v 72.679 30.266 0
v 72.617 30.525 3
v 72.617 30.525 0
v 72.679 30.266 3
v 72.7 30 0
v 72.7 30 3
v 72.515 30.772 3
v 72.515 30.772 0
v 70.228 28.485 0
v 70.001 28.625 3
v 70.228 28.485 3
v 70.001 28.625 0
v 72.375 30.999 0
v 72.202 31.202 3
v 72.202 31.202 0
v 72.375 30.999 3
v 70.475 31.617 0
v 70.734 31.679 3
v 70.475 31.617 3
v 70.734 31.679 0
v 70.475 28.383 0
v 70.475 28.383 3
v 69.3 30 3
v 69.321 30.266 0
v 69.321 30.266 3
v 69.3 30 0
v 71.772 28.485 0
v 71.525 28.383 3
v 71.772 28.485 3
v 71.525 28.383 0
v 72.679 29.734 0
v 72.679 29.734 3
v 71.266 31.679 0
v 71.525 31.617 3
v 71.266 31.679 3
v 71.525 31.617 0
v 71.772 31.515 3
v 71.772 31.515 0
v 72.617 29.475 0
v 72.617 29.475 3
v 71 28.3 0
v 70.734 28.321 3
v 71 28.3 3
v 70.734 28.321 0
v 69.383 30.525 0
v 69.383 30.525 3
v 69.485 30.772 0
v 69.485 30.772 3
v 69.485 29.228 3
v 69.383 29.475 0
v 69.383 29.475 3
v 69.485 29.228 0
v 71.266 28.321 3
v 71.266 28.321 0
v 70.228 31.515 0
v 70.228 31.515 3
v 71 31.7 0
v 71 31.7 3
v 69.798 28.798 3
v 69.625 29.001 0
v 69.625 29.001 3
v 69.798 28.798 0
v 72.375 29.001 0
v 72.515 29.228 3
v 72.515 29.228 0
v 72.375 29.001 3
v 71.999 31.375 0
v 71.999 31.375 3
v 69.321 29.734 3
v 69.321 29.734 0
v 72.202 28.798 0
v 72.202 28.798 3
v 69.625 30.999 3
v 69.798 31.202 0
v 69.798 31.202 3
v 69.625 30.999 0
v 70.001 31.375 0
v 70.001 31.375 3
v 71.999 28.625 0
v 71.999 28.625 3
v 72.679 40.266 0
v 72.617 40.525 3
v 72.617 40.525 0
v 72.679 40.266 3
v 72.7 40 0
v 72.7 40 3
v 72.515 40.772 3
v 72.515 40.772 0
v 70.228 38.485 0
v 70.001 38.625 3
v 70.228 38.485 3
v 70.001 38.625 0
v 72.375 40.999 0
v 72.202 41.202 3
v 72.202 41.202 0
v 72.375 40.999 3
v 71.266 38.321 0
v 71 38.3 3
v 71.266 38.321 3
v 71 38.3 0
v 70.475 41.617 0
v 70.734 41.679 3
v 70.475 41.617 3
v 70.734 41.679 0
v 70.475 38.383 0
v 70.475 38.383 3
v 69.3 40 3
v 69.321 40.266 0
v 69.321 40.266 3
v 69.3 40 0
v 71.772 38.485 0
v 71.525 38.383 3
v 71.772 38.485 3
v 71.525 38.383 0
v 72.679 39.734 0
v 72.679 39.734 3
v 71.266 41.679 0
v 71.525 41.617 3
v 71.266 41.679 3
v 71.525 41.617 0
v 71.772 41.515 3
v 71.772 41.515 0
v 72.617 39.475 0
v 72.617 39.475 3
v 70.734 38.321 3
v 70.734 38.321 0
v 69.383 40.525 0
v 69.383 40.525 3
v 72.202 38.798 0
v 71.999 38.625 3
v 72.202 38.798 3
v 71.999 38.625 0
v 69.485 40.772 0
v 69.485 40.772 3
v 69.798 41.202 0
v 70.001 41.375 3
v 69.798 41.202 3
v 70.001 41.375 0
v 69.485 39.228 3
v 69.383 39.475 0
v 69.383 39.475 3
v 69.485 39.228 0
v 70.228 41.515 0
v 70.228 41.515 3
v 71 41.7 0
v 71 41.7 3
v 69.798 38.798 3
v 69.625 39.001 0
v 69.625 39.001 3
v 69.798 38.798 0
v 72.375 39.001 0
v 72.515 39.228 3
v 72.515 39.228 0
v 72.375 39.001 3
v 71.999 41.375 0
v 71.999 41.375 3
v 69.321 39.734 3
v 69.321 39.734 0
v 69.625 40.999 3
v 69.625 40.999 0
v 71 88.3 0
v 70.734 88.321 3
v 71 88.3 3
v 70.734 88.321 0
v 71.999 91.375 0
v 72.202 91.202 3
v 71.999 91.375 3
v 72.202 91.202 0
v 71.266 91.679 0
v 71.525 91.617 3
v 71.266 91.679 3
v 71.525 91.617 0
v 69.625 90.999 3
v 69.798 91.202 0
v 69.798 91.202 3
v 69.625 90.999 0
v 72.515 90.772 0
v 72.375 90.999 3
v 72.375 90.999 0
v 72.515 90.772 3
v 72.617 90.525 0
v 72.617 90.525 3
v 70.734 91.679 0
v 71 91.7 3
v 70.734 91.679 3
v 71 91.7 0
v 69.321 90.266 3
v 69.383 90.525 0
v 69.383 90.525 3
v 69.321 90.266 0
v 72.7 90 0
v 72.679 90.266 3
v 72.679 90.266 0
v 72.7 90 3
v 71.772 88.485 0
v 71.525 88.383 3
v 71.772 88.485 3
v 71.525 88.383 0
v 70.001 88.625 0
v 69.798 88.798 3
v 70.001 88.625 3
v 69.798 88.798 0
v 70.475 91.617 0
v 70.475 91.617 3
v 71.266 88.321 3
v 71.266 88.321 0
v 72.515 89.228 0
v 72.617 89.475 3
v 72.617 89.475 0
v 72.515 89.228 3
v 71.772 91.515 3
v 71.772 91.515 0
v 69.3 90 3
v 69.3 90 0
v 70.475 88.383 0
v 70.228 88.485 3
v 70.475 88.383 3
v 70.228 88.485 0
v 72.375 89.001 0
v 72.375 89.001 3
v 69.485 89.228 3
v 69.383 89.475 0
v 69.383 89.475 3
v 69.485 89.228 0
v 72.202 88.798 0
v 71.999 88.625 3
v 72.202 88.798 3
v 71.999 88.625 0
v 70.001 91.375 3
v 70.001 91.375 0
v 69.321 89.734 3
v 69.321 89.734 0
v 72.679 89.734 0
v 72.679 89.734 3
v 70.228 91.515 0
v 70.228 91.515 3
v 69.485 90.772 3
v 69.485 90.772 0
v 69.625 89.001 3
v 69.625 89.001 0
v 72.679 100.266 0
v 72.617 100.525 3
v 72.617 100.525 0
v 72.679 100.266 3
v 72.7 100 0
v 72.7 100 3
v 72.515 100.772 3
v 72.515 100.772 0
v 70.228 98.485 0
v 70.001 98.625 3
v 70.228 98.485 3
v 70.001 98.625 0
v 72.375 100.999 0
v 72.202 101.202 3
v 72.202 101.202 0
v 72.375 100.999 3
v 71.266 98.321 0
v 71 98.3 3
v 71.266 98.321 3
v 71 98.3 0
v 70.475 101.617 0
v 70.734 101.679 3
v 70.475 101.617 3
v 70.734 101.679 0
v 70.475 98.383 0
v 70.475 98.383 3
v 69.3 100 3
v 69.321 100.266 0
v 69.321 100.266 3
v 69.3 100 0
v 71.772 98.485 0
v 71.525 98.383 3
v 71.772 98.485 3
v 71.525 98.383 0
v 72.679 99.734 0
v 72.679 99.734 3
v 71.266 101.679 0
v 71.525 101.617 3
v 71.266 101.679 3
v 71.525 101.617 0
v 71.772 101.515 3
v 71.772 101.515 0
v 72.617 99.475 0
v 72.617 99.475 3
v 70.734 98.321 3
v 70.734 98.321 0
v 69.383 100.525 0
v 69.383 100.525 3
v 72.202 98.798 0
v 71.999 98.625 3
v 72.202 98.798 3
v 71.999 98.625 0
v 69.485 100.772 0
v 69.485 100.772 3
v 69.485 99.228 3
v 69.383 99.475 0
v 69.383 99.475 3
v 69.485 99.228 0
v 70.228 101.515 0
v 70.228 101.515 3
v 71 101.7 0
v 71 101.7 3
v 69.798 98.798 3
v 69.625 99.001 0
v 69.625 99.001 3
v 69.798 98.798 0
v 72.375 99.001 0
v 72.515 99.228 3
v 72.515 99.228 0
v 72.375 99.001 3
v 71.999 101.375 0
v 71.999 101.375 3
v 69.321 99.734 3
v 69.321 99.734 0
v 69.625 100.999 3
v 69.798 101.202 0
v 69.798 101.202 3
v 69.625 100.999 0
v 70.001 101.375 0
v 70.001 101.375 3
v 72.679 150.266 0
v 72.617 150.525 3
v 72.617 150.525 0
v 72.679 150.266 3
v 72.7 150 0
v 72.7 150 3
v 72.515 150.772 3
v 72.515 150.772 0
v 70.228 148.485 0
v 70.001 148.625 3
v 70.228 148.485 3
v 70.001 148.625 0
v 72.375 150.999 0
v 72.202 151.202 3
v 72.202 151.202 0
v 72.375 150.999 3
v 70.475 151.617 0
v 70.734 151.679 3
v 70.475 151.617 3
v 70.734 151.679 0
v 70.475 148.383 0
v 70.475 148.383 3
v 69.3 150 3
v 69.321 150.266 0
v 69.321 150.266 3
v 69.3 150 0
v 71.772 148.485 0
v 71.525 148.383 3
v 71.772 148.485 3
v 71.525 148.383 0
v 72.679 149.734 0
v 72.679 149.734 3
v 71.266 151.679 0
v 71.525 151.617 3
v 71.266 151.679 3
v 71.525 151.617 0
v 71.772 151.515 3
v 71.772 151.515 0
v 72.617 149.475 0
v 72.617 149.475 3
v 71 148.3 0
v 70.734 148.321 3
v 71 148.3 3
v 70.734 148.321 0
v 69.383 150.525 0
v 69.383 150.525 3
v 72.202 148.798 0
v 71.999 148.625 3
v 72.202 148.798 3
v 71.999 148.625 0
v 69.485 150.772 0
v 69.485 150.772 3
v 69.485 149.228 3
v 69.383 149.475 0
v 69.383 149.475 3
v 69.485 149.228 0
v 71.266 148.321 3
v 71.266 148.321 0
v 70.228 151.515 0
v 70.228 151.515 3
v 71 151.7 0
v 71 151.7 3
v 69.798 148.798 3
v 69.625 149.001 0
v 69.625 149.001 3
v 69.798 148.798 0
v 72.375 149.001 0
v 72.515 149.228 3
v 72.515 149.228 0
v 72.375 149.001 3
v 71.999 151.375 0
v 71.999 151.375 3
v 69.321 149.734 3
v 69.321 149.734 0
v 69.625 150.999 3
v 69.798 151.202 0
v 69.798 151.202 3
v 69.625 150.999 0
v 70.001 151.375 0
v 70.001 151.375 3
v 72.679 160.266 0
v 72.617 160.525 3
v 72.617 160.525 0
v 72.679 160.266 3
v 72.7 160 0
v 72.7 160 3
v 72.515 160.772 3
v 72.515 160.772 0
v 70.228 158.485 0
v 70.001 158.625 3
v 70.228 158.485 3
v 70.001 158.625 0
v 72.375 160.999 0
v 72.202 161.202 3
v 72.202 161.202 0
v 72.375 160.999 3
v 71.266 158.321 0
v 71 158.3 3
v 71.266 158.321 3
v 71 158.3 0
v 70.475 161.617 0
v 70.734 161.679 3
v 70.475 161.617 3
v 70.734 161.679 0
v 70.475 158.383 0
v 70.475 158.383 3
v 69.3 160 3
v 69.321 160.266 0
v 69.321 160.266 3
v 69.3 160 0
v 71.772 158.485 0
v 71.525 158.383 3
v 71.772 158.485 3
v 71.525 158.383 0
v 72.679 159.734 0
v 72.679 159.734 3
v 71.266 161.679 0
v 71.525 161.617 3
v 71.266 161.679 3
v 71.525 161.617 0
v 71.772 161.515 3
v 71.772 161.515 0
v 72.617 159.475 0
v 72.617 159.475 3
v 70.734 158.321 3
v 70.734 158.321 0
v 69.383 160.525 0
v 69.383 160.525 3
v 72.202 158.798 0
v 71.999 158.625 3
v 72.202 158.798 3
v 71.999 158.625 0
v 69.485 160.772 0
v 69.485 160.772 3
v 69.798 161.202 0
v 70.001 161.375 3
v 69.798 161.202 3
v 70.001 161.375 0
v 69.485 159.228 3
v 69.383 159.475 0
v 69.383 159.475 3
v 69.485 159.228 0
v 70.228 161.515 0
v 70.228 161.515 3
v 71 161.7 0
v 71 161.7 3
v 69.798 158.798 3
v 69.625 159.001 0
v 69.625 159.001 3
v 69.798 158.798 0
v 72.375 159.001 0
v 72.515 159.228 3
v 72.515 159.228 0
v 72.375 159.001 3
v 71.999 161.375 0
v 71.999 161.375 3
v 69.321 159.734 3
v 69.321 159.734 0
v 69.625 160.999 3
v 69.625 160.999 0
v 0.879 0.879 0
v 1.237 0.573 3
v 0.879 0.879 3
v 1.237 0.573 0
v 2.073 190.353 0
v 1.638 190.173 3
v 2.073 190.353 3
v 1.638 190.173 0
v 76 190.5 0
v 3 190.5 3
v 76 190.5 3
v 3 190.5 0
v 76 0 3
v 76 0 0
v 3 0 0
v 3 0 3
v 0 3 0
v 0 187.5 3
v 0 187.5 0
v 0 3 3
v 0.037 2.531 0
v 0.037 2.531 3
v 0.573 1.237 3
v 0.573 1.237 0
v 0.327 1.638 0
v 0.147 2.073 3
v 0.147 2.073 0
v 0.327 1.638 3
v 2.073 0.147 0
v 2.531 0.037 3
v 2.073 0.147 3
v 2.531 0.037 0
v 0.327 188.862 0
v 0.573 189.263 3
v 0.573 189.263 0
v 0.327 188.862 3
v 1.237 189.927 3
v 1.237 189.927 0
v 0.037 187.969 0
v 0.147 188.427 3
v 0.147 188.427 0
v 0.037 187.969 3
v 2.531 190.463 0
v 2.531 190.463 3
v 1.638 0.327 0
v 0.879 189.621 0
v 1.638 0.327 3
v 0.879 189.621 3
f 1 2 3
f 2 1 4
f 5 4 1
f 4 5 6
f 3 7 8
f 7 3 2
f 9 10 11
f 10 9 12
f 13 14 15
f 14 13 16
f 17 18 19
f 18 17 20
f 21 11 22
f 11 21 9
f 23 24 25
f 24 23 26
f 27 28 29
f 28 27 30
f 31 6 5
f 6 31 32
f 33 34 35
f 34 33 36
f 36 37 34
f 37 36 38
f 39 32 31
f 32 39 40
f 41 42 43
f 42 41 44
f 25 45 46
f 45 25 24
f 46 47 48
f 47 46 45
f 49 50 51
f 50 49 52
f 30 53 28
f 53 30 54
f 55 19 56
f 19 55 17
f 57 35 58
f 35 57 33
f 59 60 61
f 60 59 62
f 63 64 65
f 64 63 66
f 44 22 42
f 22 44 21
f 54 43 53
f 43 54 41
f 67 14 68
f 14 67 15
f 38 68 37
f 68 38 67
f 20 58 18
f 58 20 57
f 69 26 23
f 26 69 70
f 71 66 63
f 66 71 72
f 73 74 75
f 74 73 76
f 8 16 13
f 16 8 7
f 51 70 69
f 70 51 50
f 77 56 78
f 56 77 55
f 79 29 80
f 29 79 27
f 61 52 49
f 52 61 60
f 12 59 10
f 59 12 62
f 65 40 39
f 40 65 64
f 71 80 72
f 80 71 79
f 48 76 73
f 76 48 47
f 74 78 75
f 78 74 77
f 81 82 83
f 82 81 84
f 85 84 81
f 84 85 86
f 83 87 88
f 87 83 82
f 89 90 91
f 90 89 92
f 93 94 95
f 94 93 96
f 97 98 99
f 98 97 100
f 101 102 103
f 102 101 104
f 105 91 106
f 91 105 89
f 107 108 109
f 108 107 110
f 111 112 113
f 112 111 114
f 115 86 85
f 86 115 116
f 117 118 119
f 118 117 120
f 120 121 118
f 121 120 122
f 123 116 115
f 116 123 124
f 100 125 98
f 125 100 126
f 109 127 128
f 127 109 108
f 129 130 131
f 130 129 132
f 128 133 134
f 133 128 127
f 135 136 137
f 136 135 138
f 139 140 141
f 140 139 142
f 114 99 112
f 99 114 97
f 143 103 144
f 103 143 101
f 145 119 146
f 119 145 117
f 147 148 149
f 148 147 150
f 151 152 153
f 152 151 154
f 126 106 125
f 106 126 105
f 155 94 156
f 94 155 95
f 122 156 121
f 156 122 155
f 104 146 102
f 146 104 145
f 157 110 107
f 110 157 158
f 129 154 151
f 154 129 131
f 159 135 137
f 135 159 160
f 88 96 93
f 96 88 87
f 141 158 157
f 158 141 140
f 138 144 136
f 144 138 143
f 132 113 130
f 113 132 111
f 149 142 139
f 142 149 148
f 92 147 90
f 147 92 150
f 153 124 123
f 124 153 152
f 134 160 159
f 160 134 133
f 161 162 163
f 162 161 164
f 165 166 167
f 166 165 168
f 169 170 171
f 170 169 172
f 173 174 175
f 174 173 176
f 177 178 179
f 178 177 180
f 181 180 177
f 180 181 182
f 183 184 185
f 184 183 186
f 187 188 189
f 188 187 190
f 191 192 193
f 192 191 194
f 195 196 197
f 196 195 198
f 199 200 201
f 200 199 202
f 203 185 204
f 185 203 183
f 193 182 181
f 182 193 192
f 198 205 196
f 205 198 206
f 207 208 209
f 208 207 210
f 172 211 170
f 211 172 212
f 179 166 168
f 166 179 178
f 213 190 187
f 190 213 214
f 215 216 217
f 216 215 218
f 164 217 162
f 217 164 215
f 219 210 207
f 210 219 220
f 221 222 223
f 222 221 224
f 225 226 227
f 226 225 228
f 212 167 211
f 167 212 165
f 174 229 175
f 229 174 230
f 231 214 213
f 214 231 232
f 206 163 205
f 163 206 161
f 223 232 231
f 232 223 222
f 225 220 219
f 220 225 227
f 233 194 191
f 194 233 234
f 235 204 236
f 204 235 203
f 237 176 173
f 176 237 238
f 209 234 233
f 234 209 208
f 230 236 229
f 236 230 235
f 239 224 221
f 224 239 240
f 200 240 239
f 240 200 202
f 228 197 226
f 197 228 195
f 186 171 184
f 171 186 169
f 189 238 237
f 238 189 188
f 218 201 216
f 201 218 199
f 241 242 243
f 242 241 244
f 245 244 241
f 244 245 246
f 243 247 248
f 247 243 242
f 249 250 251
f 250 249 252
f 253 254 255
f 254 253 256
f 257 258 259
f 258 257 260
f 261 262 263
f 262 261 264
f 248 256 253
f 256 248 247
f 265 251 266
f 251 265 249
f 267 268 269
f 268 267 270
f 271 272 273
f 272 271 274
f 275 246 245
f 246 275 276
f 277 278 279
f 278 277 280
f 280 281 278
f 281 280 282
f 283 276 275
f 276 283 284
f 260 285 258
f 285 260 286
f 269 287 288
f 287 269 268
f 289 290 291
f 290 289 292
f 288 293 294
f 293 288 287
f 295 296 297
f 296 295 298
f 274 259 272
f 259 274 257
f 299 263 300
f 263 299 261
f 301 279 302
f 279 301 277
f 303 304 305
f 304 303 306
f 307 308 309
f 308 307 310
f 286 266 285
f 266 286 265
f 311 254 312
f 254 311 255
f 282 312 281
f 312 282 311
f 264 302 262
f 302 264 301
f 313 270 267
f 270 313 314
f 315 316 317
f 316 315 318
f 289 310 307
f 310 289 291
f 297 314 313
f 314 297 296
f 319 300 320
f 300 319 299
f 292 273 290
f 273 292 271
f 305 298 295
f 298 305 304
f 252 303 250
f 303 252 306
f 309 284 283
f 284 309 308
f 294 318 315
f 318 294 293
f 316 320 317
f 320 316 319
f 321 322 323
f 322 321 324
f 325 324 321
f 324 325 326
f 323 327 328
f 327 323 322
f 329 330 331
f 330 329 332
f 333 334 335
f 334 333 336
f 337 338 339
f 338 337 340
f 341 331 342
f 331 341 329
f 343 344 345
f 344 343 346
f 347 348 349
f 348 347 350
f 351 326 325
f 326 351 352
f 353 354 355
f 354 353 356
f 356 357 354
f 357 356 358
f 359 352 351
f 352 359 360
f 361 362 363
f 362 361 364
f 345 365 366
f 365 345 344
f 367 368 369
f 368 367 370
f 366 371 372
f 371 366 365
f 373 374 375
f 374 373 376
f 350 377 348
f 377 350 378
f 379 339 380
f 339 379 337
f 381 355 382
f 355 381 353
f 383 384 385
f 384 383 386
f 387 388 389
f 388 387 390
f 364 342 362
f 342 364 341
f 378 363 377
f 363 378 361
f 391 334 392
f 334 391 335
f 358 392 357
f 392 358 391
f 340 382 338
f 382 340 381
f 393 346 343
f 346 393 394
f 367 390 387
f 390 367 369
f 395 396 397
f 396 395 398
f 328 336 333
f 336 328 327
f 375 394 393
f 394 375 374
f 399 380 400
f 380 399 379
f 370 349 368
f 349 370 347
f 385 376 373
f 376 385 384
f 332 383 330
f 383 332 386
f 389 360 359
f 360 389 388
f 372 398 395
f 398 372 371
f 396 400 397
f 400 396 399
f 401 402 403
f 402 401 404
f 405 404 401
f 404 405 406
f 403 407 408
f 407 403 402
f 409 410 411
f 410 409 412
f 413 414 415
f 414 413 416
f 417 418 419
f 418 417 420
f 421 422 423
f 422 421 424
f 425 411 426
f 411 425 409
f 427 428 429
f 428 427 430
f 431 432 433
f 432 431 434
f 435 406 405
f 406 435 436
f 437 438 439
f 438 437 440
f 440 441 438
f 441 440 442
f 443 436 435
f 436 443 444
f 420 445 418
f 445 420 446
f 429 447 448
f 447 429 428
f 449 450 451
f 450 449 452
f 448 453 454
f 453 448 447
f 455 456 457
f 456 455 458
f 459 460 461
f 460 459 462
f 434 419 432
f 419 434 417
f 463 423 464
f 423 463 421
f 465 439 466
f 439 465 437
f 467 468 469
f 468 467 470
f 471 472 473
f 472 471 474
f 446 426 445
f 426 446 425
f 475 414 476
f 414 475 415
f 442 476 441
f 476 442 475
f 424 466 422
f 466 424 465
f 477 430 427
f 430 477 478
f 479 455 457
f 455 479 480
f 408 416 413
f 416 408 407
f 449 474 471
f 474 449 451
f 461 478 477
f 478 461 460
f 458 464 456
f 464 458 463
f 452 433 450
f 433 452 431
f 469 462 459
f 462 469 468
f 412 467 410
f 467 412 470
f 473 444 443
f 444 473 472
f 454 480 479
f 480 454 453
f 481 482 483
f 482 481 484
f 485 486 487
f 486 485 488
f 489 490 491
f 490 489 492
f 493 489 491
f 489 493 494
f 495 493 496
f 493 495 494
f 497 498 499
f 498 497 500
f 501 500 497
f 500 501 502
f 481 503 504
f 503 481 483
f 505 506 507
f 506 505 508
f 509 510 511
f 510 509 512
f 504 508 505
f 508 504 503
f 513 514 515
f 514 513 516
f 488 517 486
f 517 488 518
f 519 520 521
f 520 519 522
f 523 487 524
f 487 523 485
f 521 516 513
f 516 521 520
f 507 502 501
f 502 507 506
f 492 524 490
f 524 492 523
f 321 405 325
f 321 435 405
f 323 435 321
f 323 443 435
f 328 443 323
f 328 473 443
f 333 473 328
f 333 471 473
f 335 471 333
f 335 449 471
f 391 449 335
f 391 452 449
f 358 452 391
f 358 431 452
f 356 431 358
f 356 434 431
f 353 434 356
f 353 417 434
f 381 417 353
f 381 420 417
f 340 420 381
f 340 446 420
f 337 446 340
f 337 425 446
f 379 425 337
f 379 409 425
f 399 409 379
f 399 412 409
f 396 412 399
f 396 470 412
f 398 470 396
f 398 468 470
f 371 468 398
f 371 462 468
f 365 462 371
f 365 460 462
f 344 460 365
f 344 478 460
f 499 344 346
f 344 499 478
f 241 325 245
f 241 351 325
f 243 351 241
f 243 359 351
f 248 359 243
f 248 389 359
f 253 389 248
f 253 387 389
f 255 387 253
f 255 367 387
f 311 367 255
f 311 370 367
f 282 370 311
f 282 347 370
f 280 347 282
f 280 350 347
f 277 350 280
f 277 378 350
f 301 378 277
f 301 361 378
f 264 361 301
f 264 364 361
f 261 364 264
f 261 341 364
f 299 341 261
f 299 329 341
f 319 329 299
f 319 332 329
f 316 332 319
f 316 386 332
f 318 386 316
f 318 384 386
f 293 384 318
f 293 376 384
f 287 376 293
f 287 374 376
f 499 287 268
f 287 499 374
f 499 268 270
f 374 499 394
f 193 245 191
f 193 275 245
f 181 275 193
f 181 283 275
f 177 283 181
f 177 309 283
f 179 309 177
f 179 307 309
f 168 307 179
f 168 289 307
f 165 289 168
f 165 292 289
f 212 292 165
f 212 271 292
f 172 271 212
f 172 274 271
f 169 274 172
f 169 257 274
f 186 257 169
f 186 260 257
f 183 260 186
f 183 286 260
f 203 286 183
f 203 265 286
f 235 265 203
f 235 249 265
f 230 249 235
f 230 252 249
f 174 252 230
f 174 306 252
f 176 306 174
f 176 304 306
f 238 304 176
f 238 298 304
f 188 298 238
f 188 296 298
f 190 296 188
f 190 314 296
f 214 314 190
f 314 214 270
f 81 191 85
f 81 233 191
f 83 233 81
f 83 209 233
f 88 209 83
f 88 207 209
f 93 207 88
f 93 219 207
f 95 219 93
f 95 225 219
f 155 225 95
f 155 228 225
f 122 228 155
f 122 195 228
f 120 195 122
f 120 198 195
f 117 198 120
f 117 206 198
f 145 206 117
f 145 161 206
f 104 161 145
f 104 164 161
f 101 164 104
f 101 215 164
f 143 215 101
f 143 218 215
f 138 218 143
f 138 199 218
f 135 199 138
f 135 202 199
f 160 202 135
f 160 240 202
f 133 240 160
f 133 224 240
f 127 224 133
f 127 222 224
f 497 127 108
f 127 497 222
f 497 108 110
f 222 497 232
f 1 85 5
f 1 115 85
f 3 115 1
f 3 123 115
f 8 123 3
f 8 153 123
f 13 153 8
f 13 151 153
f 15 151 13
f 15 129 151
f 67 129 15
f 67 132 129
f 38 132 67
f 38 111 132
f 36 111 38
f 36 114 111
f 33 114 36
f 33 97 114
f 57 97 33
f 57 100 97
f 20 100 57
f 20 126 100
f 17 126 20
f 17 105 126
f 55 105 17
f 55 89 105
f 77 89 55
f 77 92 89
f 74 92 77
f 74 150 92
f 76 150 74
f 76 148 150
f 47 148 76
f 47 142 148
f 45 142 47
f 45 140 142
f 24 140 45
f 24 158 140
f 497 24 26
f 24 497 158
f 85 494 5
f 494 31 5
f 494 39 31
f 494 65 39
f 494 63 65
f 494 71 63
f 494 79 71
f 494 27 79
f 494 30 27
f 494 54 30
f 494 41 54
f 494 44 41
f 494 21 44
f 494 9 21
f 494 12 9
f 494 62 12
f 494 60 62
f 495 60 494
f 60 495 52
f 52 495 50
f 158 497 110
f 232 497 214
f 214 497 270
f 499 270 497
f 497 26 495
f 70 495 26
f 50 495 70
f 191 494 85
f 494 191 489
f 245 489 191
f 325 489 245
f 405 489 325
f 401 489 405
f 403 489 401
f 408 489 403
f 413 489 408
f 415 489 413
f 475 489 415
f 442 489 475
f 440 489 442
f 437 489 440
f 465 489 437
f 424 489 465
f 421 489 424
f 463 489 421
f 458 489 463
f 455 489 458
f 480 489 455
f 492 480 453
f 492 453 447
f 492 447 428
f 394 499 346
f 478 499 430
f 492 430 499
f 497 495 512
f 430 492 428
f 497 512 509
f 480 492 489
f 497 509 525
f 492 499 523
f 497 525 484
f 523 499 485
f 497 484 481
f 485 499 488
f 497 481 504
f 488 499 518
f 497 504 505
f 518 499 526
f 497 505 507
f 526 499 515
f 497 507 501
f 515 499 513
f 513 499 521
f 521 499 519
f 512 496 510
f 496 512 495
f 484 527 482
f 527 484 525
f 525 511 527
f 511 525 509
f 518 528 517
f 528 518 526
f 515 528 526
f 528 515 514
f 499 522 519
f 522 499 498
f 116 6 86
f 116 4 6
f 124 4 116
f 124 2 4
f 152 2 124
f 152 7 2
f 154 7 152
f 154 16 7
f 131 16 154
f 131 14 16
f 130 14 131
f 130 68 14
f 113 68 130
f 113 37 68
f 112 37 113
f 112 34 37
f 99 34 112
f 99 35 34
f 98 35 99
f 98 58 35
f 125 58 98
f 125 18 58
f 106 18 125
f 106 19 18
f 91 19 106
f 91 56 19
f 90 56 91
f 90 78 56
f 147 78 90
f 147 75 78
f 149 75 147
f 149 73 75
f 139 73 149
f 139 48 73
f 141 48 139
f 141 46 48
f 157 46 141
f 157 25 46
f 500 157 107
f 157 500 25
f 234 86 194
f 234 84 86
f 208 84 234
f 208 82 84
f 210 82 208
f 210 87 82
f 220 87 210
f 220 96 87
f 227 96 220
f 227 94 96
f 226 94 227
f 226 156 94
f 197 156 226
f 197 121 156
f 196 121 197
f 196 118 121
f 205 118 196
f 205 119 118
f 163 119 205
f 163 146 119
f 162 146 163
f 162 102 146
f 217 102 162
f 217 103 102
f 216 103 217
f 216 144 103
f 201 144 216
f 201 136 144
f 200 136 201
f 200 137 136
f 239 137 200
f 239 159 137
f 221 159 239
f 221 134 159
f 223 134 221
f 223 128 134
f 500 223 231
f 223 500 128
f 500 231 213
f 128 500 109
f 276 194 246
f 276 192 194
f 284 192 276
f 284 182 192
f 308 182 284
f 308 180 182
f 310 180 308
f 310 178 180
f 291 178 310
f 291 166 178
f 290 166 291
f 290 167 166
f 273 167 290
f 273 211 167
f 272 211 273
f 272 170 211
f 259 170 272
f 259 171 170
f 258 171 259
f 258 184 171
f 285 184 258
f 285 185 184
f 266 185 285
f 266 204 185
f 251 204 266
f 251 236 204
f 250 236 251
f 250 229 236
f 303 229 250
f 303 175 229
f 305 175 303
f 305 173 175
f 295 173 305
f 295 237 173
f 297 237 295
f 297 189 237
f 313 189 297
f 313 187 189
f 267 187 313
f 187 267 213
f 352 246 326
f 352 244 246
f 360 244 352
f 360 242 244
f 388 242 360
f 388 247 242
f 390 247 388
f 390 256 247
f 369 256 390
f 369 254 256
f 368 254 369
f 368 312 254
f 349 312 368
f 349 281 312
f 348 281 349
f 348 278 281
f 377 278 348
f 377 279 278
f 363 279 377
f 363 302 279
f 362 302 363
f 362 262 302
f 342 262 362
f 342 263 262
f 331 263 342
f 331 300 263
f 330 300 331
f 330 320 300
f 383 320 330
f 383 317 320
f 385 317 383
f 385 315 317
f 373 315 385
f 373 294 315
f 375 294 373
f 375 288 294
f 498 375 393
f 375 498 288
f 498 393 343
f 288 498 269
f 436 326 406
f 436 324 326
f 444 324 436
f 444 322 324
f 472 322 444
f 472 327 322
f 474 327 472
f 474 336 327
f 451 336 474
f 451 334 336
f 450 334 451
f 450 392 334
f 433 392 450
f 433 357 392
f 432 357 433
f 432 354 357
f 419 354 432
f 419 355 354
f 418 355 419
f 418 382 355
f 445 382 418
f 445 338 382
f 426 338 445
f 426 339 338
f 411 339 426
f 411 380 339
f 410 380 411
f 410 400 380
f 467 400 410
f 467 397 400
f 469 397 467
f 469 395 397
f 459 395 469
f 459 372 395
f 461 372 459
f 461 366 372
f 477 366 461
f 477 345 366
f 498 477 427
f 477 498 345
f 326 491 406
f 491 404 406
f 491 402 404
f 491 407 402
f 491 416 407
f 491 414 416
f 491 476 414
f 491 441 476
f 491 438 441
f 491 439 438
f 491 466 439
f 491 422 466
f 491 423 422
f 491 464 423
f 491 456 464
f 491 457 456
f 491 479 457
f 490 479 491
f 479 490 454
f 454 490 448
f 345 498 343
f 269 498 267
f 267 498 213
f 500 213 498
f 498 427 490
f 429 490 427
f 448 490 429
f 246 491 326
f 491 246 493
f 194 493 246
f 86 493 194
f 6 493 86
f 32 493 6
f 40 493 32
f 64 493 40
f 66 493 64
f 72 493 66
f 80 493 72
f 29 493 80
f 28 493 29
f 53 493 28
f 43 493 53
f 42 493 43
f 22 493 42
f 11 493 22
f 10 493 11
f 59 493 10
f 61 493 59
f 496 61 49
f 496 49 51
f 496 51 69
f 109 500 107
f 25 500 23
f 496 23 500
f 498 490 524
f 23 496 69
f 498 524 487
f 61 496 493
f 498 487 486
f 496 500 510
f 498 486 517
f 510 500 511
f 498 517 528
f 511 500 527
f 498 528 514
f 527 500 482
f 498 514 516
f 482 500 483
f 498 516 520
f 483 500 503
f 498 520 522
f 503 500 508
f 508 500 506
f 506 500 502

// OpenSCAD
// FoldIt Robot - Left Folding Panel
// Scale: 1:4
// Dimensions: 76mm x 190.5mm x 3mm
// Folds inward (flips 180 degrees) to fold left side of clothing

$fn = 40;

// Panel parameters
panel_width = 76;       // ~half of base width (152.5 / 2)
panel_length = 190.5;   // full base length
panel_thickness = 3;

// Hinge hole parameters
m3_hole = 3.4;
hinge_hole_spacing = 30;
hinge_edge_offset = 5;       // distance from hinge edge to hole center
hinge_pair_gap = 10;

// Rounded edge radius
edge_radius = 3;

module left_panel() {
    difference() {
        // Main panel body with rounded outer edge
        _panel_body();

        // Hinge holes along inner (right) edge - matching base plate left edge
        for (i = [0:2]) {
            y_pos = 30 + i * hinge_hole_spacing * 2;
            for (j = [0:1]) {
                translate([panel_width - hinge_edge_offset, y_pos + j * hinge_pair_gap, -0.5])
                    cylinder(d=m3_hole, h=panel_thickness + 1);
            }
        }
    }
}

module _panel_body() {
    // Panel with rounded left (outer) edge
    hull() {
        // Inner edge - square corners
        translate([panel_width - 0.5, 0, 0])
            cube([0.5, panel_length, panel_thickness]);

        // Outer edge - rounded
        translate([edge_radius, edge_radius, 0])
            cylinder(r=edge_radius, h=panel_thickness);
        translate([edge_radius, panel_length - edge_radius, 0])
            cylinder(r=edge_radius, h=panel_thickness);

        // Fill the middle
        translate([edge_radius, 0, 0])
            cube([panel_width - edge_radius, panel_length, panel_thickness]);
    }
}

// Render when opened directly
left_panel();
